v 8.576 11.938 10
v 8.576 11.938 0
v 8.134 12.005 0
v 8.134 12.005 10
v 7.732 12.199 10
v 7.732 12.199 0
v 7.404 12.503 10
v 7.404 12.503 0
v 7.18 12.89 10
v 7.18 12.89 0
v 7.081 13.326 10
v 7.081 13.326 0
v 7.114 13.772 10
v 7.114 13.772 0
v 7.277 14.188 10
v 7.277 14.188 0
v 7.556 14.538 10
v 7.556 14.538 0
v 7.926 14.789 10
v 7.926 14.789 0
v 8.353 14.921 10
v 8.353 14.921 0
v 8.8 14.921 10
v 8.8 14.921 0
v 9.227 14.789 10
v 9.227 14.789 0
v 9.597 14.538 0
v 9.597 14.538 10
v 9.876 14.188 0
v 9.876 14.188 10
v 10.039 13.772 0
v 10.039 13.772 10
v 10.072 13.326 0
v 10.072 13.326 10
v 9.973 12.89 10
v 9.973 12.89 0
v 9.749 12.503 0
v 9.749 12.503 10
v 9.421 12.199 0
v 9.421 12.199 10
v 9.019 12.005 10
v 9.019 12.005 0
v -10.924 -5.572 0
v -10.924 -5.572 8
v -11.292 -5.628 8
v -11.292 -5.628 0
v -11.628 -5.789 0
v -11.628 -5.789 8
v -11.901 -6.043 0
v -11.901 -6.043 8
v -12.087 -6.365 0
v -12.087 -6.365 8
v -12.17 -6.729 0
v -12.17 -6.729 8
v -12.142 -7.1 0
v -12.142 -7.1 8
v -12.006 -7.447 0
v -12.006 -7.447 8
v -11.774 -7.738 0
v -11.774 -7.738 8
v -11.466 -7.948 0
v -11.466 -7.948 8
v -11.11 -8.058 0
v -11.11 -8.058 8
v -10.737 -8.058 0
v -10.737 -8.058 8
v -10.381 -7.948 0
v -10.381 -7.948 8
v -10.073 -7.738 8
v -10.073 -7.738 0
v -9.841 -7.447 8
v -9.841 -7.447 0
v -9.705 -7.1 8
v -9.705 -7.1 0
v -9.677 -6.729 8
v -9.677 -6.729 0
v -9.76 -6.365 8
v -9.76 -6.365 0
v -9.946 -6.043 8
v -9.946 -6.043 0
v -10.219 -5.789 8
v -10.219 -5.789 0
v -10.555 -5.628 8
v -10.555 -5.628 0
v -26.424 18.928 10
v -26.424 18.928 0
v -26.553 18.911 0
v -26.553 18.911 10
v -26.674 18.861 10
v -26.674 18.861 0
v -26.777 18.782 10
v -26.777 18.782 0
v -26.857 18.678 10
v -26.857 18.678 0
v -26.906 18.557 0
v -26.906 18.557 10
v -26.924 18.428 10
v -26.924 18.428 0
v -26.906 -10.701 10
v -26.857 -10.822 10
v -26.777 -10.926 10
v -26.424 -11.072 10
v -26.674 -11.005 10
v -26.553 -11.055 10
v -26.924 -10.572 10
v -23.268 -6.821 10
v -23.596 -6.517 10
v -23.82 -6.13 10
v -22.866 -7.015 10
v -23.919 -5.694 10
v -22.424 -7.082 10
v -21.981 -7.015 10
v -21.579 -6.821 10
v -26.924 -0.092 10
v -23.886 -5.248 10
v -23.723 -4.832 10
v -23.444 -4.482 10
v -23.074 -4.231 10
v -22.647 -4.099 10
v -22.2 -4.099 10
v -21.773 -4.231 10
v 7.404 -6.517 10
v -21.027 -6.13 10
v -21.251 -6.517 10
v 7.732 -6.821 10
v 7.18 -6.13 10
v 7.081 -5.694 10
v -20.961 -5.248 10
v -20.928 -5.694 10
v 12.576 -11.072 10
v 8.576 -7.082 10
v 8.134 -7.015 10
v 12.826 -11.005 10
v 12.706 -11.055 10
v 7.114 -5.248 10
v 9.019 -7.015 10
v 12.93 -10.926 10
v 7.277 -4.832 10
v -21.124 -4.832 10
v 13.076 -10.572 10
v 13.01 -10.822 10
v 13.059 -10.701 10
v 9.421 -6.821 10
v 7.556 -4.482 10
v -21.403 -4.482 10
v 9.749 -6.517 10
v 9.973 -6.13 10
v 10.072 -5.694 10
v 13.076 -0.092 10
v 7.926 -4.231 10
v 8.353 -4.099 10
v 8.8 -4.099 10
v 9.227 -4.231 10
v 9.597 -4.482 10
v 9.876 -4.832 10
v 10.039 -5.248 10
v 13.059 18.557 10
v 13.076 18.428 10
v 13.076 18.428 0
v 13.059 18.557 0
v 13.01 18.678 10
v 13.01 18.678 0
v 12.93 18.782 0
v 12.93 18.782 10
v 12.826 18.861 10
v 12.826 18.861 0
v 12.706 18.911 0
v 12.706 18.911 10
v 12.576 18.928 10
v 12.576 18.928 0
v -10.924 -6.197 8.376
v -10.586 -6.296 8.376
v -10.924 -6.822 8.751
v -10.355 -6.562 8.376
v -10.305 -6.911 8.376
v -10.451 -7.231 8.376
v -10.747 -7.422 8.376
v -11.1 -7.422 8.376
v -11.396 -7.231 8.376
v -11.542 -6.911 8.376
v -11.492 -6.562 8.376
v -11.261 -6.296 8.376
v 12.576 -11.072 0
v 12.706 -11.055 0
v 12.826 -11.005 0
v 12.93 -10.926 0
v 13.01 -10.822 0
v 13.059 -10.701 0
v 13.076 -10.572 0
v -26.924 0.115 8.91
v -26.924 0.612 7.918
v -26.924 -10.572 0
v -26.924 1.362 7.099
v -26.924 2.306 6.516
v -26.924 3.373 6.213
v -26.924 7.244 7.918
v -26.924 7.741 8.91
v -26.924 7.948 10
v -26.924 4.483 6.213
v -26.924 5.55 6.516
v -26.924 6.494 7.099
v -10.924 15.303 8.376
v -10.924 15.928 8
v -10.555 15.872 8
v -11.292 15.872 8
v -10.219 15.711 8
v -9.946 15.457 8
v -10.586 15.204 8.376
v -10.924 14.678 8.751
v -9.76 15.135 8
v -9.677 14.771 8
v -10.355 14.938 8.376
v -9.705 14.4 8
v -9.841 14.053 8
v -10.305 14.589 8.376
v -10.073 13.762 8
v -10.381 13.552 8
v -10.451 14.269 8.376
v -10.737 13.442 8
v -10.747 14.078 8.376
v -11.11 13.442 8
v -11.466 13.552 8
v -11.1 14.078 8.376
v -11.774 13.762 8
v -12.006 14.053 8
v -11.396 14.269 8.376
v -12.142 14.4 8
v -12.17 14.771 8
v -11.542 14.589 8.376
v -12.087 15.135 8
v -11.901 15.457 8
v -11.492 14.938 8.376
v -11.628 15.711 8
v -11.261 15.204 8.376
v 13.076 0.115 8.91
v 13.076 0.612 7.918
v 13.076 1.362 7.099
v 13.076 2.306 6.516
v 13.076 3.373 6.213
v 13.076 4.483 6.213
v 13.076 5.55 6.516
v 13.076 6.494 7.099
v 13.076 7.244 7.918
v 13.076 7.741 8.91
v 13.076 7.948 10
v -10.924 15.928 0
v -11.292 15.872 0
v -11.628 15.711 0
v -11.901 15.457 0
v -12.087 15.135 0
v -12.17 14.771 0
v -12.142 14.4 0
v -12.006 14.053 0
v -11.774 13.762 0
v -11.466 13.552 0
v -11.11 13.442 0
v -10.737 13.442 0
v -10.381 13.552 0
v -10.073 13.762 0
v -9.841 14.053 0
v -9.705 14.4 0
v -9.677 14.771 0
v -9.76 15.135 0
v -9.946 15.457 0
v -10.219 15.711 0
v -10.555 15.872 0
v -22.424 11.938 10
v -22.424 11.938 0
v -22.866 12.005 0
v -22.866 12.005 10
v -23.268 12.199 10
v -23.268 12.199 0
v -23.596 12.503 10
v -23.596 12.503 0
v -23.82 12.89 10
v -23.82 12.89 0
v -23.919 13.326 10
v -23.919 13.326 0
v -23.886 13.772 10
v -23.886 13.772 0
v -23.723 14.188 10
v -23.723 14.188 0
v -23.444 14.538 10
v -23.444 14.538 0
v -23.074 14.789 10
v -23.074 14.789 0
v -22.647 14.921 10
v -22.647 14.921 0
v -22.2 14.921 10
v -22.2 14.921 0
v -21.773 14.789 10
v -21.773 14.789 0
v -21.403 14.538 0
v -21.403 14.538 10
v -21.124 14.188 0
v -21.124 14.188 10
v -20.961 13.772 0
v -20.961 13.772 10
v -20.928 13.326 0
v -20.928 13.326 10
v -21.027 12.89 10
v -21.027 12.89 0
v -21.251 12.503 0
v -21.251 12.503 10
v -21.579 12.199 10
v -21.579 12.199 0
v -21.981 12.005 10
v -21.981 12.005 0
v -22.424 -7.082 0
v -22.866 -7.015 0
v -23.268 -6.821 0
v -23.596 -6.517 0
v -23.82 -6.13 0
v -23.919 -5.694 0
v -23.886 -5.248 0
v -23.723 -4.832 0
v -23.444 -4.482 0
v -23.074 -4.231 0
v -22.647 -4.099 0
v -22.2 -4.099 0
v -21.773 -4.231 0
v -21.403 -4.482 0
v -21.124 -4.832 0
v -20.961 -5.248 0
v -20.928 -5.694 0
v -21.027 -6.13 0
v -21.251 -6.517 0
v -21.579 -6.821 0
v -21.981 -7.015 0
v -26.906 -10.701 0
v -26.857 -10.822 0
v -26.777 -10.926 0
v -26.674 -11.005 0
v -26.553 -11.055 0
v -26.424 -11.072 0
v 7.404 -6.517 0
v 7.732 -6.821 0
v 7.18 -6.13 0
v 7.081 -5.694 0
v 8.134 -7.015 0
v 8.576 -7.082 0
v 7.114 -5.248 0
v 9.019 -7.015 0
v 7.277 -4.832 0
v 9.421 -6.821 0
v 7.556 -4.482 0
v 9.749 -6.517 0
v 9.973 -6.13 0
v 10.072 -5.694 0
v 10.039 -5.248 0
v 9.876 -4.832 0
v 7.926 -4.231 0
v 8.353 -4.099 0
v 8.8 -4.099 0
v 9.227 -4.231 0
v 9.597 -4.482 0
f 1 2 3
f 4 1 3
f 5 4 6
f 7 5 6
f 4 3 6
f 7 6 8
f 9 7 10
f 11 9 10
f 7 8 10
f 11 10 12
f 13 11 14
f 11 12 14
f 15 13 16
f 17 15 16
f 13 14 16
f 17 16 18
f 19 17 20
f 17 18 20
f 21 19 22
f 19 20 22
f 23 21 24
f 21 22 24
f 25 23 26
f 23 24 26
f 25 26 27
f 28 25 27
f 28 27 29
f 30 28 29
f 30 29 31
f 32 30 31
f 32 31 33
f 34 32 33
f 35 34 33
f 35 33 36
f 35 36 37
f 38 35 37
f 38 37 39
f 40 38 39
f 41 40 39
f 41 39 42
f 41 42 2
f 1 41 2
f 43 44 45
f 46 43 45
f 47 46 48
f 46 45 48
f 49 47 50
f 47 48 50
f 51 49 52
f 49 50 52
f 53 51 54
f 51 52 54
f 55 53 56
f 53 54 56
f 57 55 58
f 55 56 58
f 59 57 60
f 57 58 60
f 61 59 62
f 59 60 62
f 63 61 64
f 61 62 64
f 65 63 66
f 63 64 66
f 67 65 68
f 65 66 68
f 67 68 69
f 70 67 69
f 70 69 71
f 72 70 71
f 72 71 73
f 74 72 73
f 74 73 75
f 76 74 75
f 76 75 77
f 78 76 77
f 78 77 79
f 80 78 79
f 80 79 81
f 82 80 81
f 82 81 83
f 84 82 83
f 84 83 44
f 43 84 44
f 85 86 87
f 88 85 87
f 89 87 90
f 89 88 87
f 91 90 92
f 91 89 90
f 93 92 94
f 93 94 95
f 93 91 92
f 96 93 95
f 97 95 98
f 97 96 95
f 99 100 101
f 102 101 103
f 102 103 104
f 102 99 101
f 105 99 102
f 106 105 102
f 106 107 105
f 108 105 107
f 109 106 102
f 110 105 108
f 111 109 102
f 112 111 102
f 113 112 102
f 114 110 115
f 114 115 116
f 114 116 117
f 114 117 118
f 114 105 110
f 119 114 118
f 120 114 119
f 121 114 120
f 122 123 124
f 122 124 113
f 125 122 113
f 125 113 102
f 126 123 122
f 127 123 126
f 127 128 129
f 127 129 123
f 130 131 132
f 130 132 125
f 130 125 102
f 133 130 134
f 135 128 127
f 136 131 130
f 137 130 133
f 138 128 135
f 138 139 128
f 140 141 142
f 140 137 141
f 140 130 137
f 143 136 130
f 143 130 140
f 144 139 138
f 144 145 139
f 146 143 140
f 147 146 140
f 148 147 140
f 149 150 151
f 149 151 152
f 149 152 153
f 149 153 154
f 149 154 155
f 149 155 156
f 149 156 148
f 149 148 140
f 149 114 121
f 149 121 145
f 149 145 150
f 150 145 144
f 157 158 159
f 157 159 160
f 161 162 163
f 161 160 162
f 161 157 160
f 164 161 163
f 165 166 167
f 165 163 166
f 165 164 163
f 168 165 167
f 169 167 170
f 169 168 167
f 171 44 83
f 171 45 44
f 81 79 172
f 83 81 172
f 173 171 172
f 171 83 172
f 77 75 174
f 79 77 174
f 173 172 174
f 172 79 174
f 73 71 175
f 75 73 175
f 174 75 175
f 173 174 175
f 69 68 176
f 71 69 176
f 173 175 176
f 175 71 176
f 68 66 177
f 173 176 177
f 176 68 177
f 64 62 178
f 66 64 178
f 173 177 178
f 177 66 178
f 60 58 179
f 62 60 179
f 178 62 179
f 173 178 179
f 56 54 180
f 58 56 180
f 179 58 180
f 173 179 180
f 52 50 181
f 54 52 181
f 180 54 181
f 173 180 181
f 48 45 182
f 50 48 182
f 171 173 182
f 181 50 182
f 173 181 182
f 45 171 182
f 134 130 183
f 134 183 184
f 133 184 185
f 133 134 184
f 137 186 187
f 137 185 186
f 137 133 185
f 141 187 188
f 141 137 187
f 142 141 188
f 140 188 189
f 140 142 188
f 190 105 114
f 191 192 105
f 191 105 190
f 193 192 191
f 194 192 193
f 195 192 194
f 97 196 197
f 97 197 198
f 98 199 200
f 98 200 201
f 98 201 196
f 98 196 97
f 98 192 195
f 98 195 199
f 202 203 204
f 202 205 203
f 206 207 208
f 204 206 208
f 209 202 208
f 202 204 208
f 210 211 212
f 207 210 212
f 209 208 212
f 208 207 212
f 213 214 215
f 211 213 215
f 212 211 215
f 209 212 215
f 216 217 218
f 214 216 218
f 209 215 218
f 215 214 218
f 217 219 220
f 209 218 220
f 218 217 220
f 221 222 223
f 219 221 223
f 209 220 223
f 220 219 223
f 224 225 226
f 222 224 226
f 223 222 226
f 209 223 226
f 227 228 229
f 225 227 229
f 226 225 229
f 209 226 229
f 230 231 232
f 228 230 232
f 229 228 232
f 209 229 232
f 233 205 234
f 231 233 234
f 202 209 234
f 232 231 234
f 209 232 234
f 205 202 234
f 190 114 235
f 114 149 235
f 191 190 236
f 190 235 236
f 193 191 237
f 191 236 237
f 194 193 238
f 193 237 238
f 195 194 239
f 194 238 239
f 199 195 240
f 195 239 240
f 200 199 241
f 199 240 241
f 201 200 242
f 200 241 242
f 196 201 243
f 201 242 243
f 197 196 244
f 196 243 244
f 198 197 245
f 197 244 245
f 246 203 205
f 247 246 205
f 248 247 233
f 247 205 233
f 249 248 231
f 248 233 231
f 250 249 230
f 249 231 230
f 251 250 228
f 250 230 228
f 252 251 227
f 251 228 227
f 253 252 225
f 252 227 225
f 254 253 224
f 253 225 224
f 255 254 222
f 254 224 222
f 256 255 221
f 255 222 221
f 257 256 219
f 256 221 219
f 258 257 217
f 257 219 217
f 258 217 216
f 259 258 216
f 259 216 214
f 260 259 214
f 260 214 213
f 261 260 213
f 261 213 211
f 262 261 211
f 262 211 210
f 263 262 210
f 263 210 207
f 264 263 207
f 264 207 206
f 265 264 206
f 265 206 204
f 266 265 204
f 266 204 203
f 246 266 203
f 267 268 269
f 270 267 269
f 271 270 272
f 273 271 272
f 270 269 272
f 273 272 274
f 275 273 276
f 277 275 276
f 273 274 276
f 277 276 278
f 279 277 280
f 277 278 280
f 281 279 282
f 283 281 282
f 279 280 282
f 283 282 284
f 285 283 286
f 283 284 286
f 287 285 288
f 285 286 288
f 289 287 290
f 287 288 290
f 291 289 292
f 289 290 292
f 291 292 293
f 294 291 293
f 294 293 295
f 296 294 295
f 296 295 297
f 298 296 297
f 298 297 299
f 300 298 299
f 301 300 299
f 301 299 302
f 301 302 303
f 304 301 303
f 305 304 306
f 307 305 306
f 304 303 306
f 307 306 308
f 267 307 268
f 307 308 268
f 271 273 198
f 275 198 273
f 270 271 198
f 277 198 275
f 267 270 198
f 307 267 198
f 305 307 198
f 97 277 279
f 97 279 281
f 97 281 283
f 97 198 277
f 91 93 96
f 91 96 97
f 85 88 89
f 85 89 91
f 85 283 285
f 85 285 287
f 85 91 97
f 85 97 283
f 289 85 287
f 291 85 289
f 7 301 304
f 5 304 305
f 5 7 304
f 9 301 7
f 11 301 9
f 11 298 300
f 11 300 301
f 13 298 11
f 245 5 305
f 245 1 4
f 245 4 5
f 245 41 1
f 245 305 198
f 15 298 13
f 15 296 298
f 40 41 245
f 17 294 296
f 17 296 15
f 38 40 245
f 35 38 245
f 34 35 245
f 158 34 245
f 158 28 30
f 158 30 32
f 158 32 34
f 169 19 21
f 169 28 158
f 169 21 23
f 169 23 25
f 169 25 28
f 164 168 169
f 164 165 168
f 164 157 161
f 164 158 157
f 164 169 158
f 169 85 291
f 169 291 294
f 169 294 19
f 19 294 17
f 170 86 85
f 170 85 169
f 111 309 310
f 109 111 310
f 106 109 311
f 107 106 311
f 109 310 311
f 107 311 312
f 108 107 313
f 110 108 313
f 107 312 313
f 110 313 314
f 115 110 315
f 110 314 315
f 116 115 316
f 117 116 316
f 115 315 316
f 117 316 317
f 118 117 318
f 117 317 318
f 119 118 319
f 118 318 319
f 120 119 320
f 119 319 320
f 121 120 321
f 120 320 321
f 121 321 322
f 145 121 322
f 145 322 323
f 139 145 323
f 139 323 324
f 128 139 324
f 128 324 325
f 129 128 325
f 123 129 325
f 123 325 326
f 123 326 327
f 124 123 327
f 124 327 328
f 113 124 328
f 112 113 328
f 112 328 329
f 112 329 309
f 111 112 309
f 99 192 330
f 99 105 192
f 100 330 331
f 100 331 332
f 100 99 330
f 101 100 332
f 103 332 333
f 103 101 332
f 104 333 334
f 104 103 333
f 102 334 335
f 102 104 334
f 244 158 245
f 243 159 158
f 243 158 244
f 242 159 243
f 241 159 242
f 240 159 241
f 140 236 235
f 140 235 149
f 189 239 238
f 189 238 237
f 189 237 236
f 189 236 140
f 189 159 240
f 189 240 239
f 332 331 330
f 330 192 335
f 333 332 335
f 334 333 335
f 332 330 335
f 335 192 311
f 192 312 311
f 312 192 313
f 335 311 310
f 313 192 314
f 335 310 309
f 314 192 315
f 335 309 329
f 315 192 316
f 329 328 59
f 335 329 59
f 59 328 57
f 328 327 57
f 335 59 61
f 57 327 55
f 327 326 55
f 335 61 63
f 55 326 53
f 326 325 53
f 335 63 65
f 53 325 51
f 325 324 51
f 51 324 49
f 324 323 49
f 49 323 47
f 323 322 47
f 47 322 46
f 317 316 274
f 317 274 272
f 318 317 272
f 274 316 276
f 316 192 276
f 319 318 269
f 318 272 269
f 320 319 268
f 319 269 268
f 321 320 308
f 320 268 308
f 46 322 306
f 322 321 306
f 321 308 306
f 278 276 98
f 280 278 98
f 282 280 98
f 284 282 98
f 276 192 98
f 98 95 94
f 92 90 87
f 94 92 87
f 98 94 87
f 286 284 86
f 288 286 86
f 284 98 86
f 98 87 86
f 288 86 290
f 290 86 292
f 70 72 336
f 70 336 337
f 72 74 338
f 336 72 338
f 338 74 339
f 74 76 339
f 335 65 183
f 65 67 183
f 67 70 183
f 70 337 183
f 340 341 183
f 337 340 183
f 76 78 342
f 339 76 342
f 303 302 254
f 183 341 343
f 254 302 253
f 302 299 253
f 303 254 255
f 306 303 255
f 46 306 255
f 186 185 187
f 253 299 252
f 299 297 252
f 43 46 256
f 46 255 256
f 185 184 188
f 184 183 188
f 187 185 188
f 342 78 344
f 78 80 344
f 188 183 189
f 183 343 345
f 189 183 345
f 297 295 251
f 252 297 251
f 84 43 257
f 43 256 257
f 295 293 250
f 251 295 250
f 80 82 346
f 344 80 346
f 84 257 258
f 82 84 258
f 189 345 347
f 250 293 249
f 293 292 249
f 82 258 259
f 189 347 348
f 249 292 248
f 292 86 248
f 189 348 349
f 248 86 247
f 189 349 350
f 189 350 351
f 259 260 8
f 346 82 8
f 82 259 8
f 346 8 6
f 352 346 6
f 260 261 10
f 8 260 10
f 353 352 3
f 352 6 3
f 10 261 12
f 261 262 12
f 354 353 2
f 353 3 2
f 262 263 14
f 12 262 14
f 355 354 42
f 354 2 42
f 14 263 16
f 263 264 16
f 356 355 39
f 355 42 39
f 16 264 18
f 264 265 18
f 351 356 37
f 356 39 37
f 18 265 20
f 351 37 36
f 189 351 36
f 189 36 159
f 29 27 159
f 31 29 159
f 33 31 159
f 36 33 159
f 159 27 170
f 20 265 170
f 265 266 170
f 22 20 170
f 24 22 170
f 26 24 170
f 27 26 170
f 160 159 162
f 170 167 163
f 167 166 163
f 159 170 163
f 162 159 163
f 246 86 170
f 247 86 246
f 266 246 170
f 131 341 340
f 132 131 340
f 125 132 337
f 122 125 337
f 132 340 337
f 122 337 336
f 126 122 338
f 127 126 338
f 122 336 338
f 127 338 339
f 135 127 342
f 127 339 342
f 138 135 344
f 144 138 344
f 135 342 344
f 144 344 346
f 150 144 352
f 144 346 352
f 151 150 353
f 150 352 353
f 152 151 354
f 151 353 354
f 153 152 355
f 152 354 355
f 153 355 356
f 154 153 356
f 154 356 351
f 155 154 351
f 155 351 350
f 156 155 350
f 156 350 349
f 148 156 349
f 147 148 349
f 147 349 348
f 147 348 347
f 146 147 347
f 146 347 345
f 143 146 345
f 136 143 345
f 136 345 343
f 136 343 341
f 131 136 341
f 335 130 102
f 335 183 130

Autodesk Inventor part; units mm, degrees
ref_plane "YZ Plane" through (0, 0, 0) normal (1, 0, 0) x (0, 1, 0)
ref_plane "XZ Plane" through (0, 0, 0) normal (0, 1, 0) x (-1, 0, 0)
ref_plane "XY Plane" through (0, 0, 0) normal (0, 0, 1) x (1, 0, 0)
sketch "Sketch1" plane through (0, 0, 0) normal (0, 0, 1) x (1, 0, 0)
  line L0 (-26.9235, 18.928) -> (13.0765, 18.928)
  line L1 (13.0765, 18.928) -> (13.0765, -11.072)
  line L2 (13.0765, -11.072) -> (-26.9235, -11.072)
  line L3 (-26.9235, -11.072) -> (-26.9235, 18.928)
  point P0 (0, 0)
  dimension "d1" = 30
  dimension "d47" = 40
extrude "Extrusion1" add sketch "Sketch1" along normal blind 10
sketch "Sketch2" plane through (13.0765, -11.072, 10) normal (1, 0, 0) x (0, 0, -1)
  line L0 (10, 30) -> (0, 30) projected
  line L1 (0, 0) -> (0, 30) projected
  line L2 (10, 0) -> (0, 0) projected
  circle A0 centre (-0.2, 15) radius 4.025
  line L3 (10, 30) -> (10, 0) projected
  dimension "d20" = 30
  dimension "d21" = 15
  dimension "d22" = 0.2
  dimension "d23" = 8.05
extrude "Extrusion3" cut sketch "Sketch2" against normal through all contours A0 L1 | L1 A0
sketch "Sketch3" plane through (0, 0, 10) normal (0, 0, 1) x (1, 0, 0)
  line L0 (13.0765, -0.092) -> (-26.9235, -0.092) projected
  line L1 (-26.9235, -0.092) -> (-26.9235, -11.072) projected
  line L2 (-26.9235, -11.072) -> (13.0765, -11.072) projected
  line L3 (13.0765, -11.072) -> (13.0765, -0.092) projected
  line L4 (-26.9235, 7.948) -> (13.0765, 7.948) projected
  line L5 (13.0765, 7.948) -> (13.0765, 18.928) projected
  line L6 (13.0765, 18.928) -> (-26.9235, 18.928) projected
  line L7 (-26.9235, 18.928) -> (-26.9235, 7.948) projected
  point P0 (0, 0)
  point P1 (8.5765, -5.582)
  point P2 (-22.4235, -5.582)
  point P3 (8.5765, 13.438)
  point P4 (-22.4235, 13.438)
  dimension "d26" = 4.5
  dimension "d27" = 10.98
  dimension "d28" = 5.49
  dimension "d29" = 5.49
  dimension "d30" = 4.5
hole "Hole2" at (8.5765, -5.582, 10) at (-22.4235, -5.582, 10) at (8.5765, 13.438, 10) at (-22.4235, 13.438, 10) direction (0, 0, -1) diameter 3 depth 20 tip angle 118
fillet "Fillet2" radius 0.5 4 edges at (13.0765, 18.928, 5) (-26.9235, 18.928, 5) (13.0765, -11.072, 5) (-26.9235, -11.072, 5)
sketch "Sketch5" plane through (0, 0, 0) normal (0, 0, -1) x (-1, 0, 0)
  arc A0 (26.4235, -11.072) -> (26.9235, -10.572) centre (26.4235, -10.572) ccw projected
  line L0 (26.9235, -10.572) -> (26.9235, 18.428) projected
  arc A1 (26.9235, 18.428) -> (26.4235, 18.928) centre (26.4235, 18.428) ccw projected
  line L1 (26.4235, 18.928) -> (-12.5765, 18.928) projected
  arc A2 (-12.5765, 18.928) -> (-13.0765, 18.428) centre (-12.5765, 18.428) ccw projected
  line L2 (-13.0765, 18.428) -> (-13.0765, -10.572) projected
  arc A3 (-13.0765, -10.572) -> (-12.5765, -11.072) centre (-12.5765, -10.572) ccw projected
  line L3 (-12.5765, -11.072) -> (26.4235, -11.072) projected
  circle A4 centre (-8.5765, 13.438) radius 1.5 projected
  circle A5 centre (-8.5765, -5.582) radius 1.5 projected
  circle A6 centre (22.4235, -5.582) radius 1.5 projected
  circle A7 centre (22.4235, 13.438) radius 1.5 projected
  point P0 (0, 0)
  point P1 (10.9235, -6.822)
  point P2 (10.9235, 14.678)
  dimension "d48" = 4.25
  dimension "d49" = 4.25
  dimension "d50" = 16
hole "Hole4" at (-10.9235, -6.822, 0) at (-10.9235, 14.678, 0) direction (0, 0, 1) diameter 2.5 depth 8 tip angle 118
equation "\"d21\" = 0.5 * d20"
equation "\"d28\" = 0.5 * d27"
equation "\"d29\" = d28"
equation "\"d30\" = d26"
equation "\"d49\" = d48"
properties part number "3DP_PLA_Y_axis_linear_shaft_mount_clamp_with_endstop" material "ABS Plastic"
